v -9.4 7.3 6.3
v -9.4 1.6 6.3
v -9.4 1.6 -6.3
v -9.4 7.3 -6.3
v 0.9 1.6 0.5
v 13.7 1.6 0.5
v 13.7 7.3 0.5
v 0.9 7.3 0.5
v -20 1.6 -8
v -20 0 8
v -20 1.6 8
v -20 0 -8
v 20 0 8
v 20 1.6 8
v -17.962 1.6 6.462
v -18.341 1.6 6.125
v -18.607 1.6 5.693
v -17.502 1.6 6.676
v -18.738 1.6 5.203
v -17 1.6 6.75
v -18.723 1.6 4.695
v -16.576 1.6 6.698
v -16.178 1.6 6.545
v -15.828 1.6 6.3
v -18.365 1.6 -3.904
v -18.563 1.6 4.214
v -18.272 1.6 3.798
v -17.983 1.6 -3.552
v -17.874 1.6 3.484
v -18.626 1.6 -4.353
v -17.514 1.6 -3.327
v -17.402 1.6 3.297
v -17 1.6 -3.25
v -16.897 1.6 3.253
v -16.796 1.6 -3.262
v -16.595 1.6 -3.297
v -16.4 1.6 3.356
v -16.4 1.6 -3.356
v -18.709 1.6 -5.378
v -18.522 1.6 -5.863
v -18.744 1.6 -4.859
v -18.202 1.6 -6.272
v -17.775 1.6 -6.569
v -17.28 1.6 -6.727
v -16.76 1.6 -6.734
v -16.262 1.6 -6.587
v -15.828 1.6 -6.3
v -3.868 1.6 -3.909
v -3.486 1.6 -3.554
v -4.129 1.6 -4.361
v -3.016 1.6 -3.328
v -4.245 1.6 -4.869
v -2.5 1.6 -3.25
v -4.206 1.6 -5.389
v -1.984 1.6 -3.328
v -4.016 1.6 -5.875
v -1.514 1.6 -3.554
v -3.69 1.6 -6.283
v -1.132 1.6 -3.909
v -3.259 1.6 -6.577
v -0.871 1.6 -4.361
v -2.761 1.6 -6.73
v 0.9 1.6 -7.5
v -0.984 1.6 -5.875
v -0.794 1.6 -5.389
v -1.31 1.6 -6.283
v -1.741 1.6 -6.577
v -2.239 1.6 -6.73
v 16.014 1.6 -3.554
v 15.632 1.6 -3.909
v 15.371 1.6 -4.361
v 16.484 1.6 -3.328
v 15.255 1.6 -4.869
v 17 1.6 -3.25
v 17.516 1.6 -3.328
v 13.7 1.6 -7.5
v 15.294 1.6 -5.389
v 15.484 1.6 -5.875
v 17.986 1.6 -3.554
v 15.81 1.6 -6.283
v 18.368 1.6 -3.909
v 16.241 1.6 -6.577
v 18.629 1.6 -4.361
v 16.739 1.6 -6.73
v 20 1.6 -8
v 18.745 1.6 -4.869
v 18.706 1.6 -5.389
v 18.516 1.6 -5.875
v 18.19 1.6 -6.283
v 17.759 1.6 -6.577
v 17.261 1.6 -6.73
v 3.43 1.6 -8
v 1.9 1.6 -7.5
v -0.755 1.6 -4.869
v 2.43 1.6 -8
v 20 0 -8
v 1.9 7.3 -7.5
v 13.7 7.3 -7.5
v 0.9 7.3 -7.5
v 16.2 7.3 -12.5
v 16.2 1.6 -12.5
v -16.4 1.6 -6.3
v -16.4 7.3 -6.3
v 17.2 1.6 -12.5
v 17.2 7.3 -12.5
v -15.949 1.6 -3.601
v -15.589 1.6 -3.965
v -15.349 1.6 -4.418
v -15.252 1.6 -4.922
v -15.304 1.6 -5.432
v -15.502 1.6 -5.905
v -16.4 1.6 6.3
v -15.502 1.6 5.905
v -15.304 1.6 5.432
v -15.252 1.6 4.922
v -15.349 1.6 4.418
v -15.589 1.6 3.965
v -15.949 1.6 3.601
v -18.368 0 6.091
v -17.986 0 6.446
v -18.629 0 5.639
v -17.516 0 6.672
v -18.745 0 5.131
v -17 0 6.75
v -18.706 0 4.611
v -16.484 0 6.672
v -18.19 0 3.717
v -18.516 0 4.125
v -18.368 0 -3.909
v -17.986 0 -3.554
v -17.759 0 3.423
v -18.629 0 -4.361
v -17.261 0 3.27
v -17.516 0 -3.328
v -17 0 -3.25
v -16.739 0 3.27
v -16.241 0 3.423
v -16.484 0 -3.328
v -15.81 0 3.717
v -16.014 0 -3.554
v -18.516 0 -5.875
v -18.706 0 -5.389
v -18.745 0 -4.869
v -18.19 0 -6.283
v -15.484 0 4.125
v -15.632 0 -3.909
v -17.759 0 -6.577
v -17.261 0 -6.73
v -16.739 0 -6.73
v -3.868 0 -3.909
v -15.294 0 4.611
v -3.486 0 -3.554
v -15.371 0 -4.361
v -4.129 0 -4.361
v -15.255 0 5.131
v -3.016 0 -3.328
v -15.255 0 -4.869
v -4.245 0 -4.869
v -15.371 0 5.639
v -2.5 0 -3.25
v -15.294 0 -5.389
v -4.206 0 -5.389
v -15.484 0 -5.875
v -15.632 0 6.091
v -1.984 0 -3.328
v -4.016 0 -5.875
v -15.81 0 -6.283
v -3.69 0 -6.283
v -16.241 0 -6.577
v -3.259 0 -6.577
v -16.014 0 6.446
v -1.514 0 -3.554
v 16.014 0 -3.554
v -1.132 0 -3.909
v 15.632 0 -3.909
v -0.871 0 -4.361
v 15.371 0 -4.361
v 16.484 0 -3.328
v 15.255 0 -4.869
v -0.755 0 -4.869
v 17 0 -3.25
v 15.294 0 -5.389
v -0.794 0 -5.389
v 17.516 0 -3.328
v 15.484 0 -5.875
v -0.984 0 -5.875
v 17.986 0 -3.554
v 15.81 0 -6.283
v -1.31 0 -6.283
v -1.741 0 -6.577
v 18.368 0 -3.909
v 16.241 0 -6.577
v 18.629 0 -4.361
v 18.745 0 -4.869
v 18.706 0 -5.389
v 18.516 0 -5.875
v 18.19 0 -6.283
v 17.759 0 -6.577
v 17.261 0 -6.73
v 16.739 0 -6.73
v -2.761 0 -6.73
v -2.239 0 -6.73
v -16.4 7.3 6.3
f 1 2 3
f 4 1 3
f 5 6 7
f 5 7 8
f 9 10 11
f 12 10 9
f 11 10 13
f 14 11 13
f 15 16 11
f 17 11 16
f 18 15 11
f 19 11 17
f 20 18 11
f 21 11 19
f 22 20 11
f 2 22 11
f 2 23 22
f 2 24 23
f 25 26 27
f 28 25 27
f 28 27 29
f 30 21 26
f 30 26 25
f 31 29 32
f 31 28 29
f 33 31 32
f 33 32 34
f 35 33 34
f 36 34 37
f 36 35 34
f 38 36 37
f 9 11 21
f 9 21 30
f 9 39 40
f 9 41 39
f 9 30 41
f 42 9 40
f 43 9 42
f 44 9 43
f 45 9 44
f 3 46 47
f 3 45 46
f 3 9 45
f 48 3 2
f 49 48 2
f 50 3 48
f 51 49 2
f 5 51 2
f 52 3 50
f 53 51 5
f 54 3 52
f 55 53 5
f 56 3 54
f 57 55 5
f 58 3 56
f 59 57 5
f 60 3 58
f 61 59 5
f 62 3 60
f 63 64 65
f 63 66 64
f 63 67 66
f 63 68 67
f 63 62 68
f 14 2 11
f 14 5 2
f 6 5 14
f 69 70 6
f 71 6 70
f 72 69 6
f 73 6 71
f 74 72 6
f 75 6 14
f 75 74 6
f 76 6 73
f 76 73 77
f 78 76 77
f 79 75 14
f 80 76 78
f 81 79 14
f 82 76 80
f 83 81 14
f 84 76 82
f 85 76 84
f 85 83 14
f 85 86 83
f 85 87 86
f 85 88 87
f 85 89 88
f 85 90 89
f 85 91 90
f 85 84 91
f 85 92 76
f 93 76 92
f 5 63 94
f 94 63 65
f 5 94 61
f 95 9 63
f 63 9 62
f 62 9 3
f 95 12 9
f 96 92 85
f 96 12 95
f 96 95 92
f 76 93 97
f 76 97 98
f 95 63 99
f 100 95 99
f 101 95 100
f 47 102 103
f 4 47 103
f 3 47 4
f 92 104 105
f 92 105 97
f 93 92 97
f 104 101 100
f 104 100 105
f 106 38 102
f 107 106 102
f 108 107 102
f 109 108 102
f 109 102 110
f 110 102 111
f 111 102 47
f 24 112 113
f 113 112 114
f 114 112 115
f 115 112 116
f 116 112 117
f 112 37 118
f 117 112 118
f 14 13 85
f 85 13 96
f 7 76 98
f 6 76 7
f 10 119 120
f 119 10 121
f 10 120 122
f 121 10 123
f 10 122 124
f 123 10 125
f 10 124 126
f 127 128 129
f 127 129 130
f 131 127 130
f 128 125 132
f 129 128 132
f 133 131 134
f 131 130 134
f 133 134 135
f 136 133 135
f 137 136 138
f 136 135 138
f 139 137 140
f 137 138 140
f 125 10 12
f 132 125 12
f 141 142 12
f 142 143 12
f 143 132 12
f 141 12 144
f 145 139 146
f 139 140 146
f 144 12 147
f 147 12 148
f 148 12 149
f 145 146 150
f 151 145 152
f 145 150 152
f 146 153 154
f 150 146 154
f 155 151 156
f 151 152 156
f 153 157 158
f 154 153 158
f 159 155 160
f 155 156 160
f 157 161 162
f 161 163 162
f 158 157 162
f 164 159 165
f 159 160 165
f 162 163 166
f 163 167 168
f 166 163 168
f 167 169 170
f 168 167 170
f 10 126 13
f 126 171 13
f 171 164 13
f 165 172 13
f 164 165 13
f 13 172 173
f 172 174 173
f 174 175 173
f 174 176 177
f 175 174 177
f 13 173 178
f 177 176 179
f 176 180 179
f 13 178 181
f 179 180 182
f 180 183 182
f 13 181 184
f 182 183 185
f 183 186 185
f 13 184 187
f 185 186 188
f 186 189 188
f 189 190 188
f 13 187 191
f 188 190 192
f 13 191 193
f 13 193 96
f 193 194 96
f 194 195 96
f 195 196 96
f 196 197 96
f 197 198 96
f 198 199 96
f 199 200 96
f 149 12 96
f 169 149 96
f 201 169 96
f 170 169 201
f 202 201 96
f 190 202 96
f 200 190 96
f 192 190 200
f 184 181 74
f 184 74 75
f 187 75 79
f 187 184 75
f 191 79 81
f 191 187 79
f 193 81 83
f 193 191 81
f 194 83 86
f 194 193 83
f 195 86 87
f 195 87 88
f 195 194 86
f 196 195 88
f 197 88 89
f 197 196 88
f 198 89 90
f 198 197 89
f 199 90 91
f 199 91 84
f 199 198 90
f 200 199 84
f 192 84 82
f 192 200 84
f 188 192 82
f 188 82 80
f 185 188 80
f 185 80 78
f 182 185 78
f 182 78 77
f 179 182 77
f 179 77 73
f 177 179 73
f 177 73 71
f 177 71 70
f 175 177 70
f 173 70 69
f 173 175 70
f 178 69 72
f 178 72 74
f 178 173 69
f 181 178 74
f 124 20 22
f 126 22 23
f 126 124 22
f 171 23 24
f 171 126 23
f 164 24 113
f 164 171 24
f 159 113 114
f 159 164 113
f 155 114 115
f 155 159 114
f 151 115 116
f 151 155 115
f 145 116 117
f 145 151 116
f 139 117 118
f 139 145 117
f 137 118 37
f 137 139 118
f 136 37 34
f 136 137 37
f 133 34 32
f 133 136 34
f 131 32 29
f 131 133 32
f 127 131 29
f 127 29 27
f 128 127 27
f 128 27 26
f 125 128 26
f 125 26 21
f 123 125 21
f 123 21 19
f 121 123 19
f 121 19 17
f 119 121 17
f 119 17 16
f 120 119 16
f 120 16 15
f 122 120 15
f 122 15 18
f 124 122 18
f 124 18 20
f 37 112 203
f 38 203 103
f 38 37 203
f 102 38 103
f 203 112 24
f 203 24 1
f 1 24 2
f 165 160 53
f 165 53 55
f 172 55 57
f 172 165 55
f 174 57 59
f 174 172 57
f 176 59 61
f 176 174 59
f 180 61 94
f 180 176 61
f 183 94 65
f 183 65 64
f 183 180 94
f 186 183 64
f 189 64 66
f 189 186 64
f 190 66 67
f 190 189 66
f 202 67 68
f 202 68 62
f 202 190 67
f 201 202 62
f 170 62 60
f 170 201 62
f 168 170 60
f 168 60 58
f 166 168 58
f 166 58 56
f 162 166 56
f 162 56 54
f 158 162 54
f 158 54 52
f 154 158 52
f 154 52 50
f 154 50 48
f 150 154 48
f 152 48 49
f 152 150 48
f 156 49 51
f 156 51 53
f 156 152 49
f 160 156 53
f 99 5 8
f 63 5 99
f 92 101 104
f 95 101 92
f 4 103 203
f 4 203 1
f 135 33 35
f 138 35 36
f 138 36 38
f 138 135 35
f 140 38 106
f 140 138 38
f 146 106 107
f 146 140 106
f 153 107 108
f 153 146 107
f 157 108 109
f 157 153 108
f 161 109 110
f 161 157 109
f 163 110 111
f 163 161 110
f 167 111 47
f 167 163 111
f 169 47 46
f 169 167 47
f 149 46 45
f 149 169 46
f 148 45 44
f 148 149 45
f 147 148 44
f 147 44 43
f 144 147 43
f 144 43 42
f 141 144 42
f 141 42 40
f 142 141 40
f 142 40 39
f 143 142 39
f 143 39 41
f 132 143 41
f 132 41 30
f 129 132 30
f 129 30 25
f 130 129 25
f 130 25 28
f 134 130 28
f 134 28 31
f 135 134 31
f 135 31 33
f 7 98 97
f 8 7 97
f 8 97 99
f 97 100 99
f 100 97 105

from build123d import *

# Parameters (mm, degrees)
SKETCH1_W           = 40
SKETCH1_H           = 16
BOSS_EXTRUDE1_DEPTH = 1.6
SKETCH2_R           = 1.75
CUT_EXTRUDE1_DEPTH  = 1.6
BOSS_EXTRUDE2_DEPTH = 5.7
SKETCH4_W           = 7
SKETCH4_H           = 12.6
BOSS_EXTRUDE3_DEPTH = 5.7


with BuildPart() as part:
    # Sketch1 → Boss-Extrude1 (new body)
    with BuildSketch(Plane(origin=(0, 0, 0), x_dir=(1, 0, 0), z_dir=(0, 1, 0))):
        Rectangle(SKETCH1_W, SKETCH1_H)
    extrude(amount=BOSS_EXTRUDE1_DEPTH)

    # Sketch2 → Cut-Extrude1 (cut)
    with BuildSketch(Plane(origin=(0, 0, 0), x_dir=(1, 0, 0), z_dir=(0, 1, 0))):
        with Locations(Location((-17, 5, 0), (0, 0, 270))):
            Circle(SKETCH2_R)
        with Locations(Location((-17, -5, 0), (0, 0, 270))):
            Circle(SKETCH2_R)
        with Locations(Location((-2.5, 5, 0), (0, 0, 270))):
            Circle(SKETCH2_R)
        with Locations(Location((17, 5, 0), (0, 0, 270))):
            Circle(SKETCH2_R)
    extrude(amount=CUT_EXTRUDE1_DEPTH, mode=Mode.SUBTRACT)

    # Sketch3 → Boss-Extrude2 (add)
    with BuildSketch(Plane(origin=(0, 1.6, 0), x_dir=(1, 0, 0), z_dir=(0, 1, 0))):
        Polygon((0.9, 7.5), (16.2, 12.5), (17.2, 12.5), (1.9, 7.5), (13.7, 7.5), (13.7, -0.5), (0.9, -0.5), align=None)
    extrude(amount=BOSS_EXTRUDE2_DEPTH)

    # Sketch4 → Boss-Extrude3 (add)
    with BuildSketch(Plane(origin=(0, 1.6, 0), x_dir=(1, 0, 0), z_dir=(0, 1, 0))):
        with Locations((-12.9, 0)):
            Rectangle(SKETCH4_W, SKETCH4_H)
    extrude(amount=BOSS_EXTRUDE3_DEPTH)


solid = part.part
